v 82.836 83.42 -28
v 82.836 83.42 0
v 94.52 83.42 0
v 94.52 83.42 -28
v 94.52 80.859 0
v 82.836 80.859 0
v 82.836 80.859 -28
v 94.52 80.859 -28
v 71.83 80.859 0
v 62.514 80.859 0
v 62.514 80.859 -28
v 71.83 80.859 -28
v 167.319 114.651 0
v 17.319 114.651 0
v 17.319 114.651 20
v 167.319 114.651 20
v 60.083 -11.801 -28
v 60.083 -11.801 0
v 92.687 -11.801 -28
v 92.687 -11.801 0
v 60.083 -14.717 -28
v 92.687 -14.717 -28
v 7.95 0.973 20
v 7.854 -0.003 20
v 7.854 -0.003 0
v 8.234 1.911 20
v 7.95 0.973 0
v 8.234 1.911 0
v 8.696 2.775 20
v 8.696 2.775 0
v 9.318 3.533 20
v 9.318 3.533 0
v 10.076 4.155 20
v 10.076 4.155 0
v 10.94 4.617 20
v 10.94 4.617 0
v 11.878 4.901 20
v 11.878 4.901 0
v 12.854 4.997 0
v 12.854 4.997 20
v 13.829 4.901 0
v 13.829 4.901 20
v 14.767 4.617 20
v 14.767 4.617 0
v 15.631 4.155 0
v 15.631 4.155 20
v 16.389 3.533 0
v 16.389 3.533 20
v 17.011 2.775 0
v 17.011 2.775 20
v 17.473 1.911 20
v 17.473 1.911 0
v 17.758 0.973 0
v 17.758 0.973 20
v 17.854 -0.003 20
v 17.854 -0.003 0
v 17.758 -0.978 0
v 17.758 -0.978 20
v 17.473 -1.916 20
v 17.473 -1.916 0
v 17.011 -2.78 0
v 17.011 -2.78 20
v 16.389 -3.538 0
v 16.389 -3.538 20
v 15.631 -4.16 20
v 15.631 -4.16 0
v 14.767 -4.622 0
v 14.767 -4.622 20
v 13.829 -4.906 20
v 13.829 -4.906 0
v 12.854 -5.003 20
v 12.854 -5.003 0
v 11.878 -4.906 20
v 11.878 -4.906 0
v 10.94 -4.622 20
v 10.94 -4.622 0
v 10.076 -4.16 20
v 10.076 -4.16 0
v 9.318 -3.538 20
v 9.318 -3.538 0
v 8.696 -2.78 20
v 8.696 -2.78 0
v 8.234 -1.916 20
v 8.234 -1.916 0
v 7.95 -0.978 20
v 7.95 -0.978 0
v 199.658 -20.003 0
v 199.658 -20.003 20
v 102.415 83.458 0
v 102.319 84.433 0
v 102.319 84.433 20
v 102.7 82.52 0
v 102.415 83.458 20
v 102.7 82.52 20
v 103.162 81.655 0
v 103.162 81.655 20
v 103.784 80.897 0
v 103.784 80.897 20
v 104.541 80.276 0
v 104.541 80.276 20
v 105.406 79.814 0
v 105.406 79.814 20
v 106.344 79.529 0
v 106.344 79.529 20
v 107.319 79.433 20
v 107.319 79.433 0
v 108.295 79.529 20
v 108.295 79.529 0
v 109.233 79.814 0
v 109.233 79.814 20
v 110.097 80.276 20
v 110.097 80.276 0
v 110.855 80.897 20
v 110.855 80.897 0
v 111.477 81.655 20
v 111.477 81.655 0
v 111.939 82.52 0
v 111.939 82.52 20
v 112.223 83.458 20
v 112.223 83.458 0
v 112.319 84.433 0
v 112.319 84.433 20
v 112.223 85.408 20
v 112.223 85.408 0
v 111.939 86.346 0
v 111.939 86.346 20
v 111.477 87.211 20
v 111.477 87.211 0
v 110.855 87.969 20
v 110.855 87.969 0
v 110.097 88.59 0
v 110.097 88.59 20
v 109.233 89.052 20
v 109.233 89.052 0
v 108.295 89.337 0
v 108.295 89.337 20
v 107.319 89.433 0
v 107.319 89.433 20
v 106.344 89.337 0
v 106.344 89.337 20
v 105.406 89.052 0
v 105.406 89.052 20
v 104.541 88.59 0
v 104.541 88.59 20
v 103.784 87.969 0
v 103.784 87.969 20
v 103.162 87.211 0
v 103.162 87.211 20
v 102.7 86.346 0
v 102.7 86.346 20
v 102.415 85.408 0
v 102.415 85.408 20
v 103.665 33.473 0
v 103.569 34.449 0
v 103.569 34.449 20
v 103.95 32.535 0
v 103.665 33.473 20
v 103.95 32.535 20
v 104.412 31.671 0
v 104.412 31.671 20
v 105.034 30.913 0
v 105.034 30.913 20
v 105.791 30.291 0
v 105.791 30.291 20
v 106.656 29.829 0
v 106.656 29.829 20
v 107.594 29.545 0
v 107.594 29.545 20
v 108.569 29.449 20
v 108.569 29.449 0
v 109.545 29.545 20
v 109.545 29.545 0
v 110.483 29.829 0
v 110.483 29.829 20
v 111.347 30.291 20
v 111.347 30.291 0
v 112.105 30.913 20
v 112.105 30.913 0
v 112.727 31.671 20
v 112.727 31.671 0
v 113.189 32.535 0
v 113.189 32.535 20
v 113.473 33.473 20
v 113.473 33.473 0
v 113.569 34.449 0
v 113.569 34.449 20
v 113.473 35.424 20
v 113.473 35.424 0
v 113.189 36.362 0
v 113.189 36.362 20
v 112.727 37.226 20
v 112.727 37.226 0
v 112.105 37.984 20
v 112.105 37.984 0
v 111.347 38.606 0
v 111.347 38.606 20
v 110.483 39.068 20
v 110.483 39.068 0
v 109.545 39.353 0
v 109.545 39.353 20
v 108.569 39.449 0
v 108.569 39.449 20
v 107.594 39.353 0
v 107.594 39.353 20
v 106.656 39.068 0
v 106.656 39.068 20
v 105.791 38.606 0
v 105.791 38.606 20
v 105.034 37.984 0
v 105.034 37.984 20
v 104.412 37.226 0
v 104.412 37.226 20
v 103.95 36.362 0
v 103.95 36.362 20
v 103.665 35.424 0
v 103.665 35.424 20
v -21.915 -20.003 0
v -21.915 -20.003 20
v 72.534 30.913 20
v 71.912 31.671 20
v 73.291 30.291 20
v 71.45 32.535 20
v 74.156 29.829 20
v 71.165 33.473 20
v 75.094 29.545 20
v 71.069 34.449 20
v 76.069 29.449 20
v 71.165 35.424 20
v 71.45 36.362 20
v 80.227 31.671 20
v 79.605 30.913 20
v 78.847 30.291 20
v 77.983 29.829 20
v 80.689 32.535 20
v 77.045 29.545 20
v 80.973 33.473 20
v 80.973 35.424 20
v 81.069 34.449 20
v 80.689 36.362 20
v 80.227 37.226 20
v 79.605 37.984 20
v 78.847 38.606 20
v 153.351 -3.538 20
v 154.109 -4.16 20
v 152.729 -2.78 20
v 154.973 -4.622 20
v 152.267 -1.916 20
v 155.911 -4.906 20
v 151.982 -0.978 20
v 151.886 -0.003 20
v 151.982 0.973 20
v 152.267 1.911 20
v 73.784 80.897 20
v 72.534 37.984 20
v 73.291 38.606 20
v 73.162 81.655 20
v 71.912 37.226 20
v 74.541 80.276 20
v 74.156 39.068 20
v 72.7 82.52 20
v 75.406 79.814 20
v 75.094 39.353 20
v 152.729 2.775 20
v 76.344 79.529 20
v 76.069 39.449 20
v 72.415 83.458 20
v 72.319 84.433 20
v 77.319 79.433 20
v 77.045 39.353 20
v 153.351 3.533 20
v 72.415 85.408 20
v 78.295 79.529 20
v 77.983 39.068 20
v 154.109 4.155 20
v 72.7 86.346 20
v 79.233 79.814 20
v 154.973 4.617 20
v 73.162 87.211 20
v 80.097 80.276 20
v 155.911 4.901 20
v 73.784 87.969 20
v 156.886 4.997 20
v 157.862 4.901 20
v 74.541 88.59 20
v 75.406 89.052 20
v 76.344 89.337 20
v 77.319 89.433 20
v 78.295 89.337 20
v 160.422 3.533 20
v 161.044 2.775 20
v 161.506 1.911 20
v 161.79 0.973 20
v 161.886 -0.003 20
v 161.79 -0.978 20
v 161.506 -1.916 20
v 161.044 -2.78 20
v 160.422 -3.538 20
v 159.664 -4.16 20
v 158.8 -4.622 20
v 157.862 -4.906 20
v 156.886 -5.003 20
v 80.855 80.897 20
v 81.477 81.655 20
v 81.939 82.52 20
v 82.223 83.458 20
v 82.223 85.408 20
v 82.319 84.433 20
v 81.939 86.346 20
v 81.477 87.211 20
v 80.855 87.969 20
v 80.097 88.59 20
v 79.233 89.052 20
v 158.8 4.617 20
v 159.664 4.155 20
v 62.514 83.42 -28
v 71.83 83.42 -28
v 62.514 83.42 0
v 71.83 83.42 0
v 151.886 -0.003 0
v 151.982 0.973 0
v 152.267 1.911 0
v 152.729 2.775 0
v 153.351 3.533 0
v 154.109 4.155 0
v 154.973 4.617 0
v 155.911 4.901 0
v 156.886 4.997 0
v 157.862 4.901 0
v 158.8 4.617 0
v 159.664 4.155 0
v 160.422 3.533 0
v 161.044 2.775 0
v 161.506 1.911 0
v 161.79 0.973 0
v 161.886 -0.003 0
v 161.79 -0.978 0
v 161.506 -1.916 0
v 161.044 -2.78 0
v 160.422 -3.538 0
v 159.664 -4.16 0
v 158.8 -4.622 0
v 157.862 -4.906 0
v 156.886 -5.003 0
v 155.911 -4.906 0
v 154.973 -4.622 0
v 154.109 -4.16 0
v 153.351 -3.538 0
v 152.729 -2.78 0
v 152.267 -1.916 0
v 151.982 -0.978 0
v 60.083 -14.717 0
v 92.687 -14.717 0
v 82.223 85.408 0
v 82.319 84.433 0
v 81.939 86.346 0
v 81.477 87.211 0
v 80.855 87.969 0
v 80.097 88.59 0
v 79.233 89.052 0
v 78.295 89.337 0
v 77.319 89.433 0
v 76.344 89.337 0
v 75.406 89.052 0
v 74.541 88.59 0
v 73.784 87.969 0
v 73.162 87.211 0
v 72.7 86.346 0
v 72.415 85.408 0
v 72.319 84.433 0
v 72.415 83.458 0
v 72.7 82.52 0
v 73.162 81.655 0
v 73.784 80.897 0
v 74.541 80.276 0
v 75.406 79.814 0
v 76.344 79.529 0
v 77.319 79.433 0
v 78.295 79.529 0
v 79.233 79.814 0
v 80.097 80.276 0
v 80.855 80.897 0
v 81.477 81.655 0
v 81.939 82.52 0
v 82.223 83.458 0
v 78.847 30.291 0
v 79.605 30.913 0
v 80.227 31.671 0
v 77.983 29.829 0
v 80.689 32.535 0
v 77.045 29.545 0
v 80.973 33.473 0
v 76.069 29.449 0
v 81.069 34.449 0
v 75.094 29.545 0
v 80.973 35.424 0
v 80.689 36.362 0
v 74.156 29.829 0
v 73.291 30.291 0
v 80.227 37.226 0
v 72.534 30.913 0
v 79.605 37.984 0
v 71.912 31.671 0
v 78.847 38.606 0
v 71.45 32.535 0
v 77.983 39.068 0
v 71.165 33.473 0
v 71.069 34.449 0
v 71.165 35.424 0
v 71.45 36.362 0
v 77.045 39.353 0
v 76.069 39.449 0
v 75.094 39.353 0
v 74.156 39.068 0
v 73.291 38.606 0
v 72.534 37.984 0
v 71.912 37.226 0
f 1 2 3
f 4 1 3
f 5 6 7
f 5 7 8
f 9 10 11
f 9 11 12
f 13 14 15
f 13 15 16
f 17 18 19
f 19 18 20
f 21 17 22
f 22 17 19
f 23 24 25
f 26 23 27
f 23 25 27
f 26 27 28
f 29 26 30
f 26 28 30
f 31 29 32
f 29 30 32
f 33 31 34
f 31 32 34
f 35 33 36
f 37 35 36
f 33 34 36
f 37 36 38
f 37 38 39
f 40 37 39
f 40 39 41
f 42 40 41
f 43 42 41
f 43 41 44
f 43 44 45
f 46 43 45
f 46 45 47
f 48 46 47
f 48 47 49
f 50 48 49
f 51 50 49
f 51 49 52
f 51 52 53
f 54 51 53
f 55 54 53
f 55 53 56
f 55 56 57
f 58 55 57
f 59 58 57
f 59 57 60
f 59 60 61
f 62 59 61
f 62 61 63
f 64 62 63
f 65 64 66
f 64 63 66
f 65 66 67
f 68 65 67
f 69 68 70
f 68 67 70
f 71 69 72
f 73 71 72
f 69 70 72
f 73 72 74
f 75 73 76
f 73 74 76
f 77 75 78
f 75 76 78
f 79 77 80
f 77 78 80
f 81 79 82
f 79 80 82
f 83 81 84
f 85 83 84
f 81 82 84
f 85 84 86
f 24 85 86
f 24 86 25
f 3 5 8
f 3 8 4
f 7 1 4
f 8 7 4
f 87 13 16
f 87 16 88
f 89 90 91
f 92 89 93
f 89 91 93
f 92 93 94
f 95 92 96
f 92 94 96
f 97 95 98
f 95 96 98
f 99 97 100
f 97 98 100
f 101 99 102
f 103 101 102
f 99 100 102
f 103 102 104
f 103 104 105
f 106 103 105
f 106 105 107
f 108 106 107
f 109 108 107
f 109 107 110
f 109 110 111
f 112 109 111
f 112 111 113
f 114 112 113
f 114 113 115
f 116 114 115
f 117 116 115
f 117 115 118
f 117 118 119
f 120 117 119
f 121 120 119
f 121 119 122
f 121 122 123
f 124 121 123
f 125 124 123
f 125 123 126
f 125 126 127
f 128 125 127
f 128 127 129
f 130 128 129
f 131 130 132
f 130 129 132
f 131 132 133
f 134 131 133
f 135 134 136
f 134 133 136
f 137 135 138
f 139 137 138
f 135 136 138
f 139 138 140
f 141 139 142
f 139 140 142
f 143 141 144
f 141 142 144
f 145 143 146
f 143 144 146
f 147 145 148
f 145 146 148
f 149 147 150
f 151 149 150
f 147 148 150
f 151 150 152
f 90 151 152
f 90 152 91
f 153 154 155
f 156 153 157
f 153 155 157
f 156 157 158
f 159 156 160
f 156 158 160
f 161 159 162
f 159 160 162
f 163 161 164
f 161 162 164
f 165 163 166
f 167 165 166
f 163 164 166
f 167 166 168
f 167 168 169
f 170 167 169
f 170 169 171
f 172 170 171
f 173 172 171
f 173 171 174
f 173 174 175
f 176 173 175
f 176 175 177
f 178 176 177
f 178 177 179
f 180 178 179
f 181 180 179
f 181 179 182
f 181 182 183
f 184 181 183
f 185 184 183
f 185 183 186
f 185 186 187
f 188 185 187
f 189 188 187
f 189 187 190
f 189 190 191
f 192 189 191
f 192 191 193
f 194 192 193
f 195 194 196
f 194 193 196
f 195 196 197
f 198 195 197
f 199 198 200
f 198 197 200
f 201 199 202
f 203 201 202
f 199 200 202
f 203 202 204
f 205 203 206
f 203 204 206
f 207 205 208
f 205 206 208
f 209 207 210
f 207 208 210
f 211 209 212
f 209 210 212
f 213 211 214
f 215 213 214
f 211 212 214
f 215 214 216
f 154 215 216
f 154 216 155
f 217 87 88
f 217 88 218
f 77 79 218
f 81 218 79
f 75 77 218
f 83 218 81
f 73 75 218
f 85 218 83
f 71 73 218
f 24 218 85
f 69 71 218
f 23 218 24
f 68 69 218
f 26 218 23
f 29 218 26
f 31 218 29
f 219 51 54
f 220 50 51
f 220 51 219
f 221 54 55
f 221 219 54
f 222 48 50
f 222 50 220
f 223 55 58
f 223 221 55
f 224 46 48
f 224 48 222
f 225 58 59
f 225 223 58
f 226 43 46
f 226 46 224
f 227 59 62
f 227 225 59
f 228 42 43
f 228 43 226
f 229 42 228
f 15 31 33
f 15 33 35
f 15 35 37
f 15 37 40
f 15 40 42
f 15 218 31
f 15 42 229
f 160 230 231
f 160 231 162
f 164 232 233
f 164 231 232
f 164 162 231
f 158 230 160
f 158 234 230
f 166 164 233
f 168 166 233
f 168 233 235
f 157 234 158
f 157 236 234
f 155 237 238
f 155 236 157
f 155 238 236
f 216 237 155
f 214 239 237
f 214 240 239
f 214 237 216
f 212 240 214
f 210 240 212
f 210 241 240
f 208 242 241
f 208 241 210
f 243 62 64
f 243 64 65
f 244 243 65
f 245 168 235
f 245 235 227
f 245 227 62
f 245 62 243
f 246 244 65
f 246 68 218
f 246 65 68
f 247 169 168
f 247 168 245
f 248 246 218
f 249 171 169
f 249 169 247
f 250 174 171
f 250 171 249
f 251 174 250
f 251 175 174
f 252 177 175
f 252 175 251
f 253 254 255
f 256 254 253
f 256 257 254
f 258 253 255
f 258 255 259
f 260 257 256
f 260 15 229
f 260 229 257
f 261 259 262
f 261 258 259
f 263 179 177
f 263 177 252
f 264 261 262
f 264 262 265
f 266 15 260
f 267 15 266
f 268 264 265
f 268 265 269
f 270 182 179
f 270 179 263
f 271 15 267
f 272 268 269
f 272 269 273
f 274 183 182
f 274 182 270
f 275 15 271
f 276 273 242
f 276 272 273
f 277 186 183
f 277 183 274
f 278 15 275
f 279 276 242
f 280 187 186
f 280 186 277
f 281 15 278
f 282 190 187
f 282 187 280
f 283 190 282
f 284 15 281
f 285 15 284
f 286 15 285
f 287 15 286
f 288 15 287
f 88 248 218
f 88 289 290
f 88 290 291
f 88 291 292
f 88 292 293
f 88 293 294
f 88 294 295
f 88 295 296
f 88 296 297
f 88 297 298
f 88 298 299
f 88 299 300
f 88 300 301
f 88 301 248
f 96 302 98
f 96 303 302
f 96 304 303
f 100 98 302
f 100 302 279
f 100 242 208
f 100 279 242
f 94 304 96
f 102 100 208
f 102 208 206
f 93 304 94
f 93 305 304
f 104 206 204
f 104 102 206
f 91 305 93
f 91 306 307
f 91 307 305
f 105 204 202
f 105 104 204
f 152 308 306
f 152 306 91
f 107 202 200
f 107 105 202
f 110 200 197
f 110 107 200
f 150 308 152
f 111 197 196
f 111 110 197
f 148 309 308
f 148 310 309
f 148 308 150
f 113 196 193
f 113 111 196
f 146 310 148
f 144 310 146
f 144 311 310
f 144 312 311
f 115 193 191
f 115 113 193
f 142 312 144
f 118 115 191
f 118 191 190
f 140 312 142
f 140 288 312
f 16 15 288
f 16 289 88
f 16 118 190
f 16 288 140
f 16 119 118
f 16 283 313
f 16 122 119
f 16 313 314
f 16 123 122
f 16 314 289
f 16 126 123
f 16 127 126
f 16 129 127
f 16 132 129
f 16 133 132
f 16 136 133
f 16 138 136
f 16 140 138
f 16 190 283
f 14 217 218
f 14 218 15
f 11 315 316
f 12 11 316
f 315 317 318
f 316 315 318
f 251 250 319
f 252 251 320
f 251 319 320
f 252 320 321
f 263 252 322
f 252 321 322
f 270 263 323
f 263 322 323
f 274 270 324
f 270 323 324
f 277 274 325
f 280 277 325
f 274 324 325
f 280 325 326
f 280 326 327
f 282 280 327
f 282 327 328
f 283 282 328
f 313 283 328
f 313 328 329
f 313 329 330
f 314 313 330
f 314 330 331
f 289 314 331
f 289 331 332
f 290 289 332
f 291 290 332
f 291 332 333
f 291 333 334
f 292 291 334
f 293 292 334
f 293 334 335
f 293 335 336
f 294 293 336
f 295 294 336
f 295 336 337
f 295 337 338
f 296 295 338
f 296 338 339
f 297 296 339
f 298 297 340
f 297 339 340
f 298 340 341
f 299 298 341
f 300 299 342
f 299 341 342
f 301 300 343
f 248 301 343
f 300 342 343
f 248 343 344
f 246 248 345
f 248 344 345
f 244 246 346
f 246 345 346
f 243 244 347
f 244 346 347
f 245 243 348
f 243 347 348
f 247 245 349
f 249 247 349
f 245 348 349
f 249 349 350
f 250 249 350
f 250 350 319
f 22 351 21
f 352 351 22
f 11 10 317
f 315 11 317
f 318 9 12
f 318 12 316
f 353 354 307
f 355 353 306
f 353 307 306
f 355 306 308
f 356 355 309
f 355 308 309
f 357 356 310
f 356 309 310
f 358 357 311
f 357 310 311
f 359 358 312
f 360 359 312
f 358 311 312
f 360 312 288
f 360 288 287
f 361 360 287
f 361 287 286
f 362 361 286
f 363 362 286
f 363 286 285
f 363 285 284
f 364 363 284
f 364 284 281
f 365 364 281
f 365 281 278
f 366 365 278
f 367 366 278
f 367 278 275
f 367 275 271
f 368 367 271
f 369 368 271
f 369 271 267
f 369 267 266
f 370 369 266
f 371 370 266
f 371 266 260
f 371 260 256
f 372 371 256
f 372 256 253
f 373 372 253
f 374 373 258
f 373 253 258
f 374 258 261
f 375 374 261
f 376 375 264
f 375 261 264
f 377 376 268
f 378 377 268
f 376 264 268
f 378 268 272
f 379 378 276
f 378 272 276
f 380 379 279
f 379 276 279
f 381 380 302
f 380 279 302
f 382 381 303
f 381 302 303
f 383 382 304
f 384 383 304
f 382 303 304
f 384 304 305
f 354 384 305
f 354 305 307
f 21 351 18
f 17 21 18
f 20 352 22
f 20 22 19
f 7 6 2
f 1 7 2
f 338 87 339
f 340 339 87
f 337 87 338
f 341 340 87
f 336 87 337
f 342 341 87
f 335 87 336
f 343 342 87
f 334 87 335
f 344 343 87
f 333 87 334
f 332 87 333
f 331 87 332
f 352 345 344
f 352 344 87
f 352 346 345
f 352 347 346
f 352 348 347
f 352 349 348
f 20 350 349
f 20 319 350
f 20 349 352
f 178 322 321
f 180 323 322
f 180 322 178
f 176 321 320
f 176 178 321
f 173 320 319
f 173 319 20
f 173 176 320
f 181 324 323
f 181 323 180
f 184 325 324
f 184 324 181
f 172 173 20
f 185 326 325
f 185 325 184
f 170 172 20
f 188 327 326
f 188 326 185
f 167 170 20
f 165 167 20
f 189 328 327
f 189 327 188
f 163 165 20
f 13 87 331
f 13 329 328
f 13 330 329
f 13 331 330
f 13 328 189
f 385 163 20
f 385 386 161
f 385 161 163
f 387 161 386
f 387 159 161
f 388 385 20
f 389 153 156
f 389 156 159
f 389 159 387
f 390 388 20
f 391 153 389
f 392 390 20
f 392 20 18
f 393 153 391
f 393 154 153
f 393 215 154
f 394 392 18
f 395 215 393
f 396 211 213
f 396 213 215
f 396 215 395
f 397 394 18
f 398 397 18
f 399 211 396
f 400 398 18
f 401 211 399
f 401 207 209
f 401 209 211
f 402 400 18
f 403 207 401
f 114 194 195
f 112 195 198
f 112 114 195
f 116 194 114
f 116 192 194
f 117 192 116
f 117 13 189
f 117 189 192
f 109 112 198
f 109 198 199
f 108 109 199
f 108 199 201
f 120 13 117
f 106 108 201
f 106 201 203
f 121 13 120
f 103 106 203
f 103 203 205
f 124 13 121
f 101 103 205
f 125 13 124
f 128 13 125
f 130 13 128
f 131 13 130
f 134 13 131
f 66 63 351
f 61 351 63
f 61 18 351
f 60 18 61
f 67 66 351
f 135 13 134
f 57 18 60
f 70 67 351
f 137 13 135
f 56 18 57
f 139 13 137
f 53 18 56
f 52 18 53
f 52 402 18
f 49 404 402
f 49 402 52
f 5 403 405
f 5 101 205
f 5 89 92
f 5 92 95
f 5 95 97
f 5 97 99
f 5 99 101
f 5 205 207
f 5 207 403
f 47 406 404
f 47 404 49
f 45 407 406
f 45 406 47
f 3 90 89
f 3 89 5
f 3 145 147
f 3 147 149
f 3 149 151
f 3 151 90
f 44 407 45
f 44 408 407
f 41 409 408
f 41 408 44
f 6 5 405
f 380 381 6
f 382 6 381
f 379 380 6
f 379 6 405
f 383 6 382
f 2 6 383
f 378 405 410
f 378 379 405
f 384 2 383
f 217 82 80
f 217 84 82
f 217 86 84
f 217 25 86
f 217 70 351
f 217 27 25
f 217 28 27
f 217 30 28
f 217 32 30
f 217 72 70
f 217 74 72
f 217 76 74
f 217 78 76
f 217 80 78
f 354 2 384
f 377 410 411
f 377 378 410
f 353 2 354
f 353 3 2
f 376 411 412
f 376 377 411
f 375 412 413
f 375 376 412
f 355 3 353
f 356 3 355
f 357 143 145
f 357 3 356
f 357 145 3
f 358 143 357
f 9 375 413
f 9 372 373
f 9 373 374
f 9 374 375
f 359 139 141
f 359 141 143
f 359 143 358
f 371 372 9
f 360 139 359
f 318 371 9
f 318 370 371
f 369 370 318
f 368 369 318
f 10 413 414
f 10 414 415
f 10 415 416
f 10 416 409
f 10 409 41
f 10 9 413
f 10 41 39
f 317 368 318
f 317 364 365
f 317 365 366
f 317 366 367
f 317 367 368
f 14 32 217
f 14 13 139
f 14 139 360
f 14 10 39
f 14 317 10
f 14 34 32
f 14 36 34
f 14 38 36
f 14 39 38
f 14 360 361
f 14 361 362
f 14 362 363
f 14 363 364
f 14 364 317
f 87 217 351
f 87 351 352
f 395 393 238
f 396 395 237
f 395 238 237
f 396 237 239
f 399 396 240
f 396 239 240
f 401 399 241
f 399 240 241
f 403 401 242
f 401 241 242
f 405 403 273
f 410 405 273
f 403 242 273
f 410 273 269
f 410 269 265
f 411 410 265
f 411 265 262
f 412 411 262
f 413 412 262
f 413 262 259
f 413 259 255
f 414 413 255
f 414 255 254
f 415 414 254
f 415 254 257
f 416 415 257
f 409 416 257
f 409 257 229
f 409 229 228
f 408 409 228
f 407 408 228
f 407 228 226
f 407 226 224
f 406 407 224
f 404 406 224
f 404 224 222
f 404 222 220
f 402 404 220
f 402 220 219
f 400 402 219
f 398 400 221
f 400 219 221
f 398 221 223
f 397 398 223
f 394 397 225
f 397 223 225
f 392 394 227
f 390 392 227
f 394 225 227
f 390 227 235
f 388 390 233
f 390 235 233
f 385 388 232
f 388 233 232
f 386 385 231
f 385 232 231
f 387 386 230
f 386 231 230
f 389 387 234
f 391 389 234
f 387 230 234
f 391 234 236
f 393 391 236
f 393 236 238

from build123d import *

# Parameters (mm, degrees)
EXTRUDE_1_DEPTH     = 20
SKETCH_2_R          = 5
CUT_EXTRUDE_1_DEPTH = 232.102536476
SKETCH_3_W          = 32.604324085
SKETCH_3_H          = 2.91589364
SKETCH_3_W_2        = 9.316519648
SKETCH_3_H_2        = 2.560664992
SKETCH_3_W_3        = 11.683825265
EXTRUDE_2_DEPTH     = 48
SKETCH_5_R          = 5
CUT_EXTRUDE_2_DEPTH = 28


with BuildPart() as part:
    # 草图1 → 凸台-拉伸1 (new body)
    with BuildSketch(Plane.XY):
        Polygon((17.319300214, 114.65132411), (167.319300214, 114.65132411), (199.6583488, -20.002569933), (-21.915099237, -20.002569933), align=None)
    extrude(amount=EXTRUDE_1_DEPTH)

    # 草图2 → 切除-拉伸1 (cut, through all)
    with BuildSketch(Plane.XY.offset(20)):
        with Locations((77.319300214, 84.433001075)):
            Circle(SKETCH_2_R)
        with Locations((76.069300214, 34.448628517)):
            Circle(SKETCH_2_R)
        with Locations(Location((108.569300214, 34.448628517, 0), (0, 0, 180))):
            Circle(SKETCH_2_R)
        with Locations(Location((107.319300214, 84.433001075, 0), (0, 0, 180))):
            Circle(SKETCH_2_R)
    extrude(amount=-CUT_EXTRUDE_1_DEPTH, mode=Mode.SUBTRACT)

    # 草图3 → 凸台-拉伸2 (add)
    with BuildSketch(Plane.XY.offset(20)):
        with Locations((76.385027523, -13.259318303)):
            Rectangle(SKETCH_3_W, SKETCH_3_H)
        with Locations((67.171853972, 82.139796752)):
            Rectangle(SKETCH_3_W_2, SKETCH_3_H_2)
        with Locations((88.67813561, 82.139796752)):
            Rectangle(SKETCH_3_W_3, SKETCH_3_H_2)
    extrude(amount=-EXTRUDE_2_DEPTH)

    # 草图5 → 切除-拉伸2 (cut)
    with BuildSketch(Plane(origin=(0, 0, 0), x_dir=(-1, 0, 0), z_dir=(0, 0, -1))):
        with Locations((-156.886362857, -0.002569933)):
            Circle(SKETCH_5_R)
        with Locations((-12.853580473, -0.002569933)):
            Circle(SKETCH_5_R)
    extrude(amount=-CUT_EXTRUDE_2_DEPTH, mode=Mode.SUBTRACT)


solid = part.part
